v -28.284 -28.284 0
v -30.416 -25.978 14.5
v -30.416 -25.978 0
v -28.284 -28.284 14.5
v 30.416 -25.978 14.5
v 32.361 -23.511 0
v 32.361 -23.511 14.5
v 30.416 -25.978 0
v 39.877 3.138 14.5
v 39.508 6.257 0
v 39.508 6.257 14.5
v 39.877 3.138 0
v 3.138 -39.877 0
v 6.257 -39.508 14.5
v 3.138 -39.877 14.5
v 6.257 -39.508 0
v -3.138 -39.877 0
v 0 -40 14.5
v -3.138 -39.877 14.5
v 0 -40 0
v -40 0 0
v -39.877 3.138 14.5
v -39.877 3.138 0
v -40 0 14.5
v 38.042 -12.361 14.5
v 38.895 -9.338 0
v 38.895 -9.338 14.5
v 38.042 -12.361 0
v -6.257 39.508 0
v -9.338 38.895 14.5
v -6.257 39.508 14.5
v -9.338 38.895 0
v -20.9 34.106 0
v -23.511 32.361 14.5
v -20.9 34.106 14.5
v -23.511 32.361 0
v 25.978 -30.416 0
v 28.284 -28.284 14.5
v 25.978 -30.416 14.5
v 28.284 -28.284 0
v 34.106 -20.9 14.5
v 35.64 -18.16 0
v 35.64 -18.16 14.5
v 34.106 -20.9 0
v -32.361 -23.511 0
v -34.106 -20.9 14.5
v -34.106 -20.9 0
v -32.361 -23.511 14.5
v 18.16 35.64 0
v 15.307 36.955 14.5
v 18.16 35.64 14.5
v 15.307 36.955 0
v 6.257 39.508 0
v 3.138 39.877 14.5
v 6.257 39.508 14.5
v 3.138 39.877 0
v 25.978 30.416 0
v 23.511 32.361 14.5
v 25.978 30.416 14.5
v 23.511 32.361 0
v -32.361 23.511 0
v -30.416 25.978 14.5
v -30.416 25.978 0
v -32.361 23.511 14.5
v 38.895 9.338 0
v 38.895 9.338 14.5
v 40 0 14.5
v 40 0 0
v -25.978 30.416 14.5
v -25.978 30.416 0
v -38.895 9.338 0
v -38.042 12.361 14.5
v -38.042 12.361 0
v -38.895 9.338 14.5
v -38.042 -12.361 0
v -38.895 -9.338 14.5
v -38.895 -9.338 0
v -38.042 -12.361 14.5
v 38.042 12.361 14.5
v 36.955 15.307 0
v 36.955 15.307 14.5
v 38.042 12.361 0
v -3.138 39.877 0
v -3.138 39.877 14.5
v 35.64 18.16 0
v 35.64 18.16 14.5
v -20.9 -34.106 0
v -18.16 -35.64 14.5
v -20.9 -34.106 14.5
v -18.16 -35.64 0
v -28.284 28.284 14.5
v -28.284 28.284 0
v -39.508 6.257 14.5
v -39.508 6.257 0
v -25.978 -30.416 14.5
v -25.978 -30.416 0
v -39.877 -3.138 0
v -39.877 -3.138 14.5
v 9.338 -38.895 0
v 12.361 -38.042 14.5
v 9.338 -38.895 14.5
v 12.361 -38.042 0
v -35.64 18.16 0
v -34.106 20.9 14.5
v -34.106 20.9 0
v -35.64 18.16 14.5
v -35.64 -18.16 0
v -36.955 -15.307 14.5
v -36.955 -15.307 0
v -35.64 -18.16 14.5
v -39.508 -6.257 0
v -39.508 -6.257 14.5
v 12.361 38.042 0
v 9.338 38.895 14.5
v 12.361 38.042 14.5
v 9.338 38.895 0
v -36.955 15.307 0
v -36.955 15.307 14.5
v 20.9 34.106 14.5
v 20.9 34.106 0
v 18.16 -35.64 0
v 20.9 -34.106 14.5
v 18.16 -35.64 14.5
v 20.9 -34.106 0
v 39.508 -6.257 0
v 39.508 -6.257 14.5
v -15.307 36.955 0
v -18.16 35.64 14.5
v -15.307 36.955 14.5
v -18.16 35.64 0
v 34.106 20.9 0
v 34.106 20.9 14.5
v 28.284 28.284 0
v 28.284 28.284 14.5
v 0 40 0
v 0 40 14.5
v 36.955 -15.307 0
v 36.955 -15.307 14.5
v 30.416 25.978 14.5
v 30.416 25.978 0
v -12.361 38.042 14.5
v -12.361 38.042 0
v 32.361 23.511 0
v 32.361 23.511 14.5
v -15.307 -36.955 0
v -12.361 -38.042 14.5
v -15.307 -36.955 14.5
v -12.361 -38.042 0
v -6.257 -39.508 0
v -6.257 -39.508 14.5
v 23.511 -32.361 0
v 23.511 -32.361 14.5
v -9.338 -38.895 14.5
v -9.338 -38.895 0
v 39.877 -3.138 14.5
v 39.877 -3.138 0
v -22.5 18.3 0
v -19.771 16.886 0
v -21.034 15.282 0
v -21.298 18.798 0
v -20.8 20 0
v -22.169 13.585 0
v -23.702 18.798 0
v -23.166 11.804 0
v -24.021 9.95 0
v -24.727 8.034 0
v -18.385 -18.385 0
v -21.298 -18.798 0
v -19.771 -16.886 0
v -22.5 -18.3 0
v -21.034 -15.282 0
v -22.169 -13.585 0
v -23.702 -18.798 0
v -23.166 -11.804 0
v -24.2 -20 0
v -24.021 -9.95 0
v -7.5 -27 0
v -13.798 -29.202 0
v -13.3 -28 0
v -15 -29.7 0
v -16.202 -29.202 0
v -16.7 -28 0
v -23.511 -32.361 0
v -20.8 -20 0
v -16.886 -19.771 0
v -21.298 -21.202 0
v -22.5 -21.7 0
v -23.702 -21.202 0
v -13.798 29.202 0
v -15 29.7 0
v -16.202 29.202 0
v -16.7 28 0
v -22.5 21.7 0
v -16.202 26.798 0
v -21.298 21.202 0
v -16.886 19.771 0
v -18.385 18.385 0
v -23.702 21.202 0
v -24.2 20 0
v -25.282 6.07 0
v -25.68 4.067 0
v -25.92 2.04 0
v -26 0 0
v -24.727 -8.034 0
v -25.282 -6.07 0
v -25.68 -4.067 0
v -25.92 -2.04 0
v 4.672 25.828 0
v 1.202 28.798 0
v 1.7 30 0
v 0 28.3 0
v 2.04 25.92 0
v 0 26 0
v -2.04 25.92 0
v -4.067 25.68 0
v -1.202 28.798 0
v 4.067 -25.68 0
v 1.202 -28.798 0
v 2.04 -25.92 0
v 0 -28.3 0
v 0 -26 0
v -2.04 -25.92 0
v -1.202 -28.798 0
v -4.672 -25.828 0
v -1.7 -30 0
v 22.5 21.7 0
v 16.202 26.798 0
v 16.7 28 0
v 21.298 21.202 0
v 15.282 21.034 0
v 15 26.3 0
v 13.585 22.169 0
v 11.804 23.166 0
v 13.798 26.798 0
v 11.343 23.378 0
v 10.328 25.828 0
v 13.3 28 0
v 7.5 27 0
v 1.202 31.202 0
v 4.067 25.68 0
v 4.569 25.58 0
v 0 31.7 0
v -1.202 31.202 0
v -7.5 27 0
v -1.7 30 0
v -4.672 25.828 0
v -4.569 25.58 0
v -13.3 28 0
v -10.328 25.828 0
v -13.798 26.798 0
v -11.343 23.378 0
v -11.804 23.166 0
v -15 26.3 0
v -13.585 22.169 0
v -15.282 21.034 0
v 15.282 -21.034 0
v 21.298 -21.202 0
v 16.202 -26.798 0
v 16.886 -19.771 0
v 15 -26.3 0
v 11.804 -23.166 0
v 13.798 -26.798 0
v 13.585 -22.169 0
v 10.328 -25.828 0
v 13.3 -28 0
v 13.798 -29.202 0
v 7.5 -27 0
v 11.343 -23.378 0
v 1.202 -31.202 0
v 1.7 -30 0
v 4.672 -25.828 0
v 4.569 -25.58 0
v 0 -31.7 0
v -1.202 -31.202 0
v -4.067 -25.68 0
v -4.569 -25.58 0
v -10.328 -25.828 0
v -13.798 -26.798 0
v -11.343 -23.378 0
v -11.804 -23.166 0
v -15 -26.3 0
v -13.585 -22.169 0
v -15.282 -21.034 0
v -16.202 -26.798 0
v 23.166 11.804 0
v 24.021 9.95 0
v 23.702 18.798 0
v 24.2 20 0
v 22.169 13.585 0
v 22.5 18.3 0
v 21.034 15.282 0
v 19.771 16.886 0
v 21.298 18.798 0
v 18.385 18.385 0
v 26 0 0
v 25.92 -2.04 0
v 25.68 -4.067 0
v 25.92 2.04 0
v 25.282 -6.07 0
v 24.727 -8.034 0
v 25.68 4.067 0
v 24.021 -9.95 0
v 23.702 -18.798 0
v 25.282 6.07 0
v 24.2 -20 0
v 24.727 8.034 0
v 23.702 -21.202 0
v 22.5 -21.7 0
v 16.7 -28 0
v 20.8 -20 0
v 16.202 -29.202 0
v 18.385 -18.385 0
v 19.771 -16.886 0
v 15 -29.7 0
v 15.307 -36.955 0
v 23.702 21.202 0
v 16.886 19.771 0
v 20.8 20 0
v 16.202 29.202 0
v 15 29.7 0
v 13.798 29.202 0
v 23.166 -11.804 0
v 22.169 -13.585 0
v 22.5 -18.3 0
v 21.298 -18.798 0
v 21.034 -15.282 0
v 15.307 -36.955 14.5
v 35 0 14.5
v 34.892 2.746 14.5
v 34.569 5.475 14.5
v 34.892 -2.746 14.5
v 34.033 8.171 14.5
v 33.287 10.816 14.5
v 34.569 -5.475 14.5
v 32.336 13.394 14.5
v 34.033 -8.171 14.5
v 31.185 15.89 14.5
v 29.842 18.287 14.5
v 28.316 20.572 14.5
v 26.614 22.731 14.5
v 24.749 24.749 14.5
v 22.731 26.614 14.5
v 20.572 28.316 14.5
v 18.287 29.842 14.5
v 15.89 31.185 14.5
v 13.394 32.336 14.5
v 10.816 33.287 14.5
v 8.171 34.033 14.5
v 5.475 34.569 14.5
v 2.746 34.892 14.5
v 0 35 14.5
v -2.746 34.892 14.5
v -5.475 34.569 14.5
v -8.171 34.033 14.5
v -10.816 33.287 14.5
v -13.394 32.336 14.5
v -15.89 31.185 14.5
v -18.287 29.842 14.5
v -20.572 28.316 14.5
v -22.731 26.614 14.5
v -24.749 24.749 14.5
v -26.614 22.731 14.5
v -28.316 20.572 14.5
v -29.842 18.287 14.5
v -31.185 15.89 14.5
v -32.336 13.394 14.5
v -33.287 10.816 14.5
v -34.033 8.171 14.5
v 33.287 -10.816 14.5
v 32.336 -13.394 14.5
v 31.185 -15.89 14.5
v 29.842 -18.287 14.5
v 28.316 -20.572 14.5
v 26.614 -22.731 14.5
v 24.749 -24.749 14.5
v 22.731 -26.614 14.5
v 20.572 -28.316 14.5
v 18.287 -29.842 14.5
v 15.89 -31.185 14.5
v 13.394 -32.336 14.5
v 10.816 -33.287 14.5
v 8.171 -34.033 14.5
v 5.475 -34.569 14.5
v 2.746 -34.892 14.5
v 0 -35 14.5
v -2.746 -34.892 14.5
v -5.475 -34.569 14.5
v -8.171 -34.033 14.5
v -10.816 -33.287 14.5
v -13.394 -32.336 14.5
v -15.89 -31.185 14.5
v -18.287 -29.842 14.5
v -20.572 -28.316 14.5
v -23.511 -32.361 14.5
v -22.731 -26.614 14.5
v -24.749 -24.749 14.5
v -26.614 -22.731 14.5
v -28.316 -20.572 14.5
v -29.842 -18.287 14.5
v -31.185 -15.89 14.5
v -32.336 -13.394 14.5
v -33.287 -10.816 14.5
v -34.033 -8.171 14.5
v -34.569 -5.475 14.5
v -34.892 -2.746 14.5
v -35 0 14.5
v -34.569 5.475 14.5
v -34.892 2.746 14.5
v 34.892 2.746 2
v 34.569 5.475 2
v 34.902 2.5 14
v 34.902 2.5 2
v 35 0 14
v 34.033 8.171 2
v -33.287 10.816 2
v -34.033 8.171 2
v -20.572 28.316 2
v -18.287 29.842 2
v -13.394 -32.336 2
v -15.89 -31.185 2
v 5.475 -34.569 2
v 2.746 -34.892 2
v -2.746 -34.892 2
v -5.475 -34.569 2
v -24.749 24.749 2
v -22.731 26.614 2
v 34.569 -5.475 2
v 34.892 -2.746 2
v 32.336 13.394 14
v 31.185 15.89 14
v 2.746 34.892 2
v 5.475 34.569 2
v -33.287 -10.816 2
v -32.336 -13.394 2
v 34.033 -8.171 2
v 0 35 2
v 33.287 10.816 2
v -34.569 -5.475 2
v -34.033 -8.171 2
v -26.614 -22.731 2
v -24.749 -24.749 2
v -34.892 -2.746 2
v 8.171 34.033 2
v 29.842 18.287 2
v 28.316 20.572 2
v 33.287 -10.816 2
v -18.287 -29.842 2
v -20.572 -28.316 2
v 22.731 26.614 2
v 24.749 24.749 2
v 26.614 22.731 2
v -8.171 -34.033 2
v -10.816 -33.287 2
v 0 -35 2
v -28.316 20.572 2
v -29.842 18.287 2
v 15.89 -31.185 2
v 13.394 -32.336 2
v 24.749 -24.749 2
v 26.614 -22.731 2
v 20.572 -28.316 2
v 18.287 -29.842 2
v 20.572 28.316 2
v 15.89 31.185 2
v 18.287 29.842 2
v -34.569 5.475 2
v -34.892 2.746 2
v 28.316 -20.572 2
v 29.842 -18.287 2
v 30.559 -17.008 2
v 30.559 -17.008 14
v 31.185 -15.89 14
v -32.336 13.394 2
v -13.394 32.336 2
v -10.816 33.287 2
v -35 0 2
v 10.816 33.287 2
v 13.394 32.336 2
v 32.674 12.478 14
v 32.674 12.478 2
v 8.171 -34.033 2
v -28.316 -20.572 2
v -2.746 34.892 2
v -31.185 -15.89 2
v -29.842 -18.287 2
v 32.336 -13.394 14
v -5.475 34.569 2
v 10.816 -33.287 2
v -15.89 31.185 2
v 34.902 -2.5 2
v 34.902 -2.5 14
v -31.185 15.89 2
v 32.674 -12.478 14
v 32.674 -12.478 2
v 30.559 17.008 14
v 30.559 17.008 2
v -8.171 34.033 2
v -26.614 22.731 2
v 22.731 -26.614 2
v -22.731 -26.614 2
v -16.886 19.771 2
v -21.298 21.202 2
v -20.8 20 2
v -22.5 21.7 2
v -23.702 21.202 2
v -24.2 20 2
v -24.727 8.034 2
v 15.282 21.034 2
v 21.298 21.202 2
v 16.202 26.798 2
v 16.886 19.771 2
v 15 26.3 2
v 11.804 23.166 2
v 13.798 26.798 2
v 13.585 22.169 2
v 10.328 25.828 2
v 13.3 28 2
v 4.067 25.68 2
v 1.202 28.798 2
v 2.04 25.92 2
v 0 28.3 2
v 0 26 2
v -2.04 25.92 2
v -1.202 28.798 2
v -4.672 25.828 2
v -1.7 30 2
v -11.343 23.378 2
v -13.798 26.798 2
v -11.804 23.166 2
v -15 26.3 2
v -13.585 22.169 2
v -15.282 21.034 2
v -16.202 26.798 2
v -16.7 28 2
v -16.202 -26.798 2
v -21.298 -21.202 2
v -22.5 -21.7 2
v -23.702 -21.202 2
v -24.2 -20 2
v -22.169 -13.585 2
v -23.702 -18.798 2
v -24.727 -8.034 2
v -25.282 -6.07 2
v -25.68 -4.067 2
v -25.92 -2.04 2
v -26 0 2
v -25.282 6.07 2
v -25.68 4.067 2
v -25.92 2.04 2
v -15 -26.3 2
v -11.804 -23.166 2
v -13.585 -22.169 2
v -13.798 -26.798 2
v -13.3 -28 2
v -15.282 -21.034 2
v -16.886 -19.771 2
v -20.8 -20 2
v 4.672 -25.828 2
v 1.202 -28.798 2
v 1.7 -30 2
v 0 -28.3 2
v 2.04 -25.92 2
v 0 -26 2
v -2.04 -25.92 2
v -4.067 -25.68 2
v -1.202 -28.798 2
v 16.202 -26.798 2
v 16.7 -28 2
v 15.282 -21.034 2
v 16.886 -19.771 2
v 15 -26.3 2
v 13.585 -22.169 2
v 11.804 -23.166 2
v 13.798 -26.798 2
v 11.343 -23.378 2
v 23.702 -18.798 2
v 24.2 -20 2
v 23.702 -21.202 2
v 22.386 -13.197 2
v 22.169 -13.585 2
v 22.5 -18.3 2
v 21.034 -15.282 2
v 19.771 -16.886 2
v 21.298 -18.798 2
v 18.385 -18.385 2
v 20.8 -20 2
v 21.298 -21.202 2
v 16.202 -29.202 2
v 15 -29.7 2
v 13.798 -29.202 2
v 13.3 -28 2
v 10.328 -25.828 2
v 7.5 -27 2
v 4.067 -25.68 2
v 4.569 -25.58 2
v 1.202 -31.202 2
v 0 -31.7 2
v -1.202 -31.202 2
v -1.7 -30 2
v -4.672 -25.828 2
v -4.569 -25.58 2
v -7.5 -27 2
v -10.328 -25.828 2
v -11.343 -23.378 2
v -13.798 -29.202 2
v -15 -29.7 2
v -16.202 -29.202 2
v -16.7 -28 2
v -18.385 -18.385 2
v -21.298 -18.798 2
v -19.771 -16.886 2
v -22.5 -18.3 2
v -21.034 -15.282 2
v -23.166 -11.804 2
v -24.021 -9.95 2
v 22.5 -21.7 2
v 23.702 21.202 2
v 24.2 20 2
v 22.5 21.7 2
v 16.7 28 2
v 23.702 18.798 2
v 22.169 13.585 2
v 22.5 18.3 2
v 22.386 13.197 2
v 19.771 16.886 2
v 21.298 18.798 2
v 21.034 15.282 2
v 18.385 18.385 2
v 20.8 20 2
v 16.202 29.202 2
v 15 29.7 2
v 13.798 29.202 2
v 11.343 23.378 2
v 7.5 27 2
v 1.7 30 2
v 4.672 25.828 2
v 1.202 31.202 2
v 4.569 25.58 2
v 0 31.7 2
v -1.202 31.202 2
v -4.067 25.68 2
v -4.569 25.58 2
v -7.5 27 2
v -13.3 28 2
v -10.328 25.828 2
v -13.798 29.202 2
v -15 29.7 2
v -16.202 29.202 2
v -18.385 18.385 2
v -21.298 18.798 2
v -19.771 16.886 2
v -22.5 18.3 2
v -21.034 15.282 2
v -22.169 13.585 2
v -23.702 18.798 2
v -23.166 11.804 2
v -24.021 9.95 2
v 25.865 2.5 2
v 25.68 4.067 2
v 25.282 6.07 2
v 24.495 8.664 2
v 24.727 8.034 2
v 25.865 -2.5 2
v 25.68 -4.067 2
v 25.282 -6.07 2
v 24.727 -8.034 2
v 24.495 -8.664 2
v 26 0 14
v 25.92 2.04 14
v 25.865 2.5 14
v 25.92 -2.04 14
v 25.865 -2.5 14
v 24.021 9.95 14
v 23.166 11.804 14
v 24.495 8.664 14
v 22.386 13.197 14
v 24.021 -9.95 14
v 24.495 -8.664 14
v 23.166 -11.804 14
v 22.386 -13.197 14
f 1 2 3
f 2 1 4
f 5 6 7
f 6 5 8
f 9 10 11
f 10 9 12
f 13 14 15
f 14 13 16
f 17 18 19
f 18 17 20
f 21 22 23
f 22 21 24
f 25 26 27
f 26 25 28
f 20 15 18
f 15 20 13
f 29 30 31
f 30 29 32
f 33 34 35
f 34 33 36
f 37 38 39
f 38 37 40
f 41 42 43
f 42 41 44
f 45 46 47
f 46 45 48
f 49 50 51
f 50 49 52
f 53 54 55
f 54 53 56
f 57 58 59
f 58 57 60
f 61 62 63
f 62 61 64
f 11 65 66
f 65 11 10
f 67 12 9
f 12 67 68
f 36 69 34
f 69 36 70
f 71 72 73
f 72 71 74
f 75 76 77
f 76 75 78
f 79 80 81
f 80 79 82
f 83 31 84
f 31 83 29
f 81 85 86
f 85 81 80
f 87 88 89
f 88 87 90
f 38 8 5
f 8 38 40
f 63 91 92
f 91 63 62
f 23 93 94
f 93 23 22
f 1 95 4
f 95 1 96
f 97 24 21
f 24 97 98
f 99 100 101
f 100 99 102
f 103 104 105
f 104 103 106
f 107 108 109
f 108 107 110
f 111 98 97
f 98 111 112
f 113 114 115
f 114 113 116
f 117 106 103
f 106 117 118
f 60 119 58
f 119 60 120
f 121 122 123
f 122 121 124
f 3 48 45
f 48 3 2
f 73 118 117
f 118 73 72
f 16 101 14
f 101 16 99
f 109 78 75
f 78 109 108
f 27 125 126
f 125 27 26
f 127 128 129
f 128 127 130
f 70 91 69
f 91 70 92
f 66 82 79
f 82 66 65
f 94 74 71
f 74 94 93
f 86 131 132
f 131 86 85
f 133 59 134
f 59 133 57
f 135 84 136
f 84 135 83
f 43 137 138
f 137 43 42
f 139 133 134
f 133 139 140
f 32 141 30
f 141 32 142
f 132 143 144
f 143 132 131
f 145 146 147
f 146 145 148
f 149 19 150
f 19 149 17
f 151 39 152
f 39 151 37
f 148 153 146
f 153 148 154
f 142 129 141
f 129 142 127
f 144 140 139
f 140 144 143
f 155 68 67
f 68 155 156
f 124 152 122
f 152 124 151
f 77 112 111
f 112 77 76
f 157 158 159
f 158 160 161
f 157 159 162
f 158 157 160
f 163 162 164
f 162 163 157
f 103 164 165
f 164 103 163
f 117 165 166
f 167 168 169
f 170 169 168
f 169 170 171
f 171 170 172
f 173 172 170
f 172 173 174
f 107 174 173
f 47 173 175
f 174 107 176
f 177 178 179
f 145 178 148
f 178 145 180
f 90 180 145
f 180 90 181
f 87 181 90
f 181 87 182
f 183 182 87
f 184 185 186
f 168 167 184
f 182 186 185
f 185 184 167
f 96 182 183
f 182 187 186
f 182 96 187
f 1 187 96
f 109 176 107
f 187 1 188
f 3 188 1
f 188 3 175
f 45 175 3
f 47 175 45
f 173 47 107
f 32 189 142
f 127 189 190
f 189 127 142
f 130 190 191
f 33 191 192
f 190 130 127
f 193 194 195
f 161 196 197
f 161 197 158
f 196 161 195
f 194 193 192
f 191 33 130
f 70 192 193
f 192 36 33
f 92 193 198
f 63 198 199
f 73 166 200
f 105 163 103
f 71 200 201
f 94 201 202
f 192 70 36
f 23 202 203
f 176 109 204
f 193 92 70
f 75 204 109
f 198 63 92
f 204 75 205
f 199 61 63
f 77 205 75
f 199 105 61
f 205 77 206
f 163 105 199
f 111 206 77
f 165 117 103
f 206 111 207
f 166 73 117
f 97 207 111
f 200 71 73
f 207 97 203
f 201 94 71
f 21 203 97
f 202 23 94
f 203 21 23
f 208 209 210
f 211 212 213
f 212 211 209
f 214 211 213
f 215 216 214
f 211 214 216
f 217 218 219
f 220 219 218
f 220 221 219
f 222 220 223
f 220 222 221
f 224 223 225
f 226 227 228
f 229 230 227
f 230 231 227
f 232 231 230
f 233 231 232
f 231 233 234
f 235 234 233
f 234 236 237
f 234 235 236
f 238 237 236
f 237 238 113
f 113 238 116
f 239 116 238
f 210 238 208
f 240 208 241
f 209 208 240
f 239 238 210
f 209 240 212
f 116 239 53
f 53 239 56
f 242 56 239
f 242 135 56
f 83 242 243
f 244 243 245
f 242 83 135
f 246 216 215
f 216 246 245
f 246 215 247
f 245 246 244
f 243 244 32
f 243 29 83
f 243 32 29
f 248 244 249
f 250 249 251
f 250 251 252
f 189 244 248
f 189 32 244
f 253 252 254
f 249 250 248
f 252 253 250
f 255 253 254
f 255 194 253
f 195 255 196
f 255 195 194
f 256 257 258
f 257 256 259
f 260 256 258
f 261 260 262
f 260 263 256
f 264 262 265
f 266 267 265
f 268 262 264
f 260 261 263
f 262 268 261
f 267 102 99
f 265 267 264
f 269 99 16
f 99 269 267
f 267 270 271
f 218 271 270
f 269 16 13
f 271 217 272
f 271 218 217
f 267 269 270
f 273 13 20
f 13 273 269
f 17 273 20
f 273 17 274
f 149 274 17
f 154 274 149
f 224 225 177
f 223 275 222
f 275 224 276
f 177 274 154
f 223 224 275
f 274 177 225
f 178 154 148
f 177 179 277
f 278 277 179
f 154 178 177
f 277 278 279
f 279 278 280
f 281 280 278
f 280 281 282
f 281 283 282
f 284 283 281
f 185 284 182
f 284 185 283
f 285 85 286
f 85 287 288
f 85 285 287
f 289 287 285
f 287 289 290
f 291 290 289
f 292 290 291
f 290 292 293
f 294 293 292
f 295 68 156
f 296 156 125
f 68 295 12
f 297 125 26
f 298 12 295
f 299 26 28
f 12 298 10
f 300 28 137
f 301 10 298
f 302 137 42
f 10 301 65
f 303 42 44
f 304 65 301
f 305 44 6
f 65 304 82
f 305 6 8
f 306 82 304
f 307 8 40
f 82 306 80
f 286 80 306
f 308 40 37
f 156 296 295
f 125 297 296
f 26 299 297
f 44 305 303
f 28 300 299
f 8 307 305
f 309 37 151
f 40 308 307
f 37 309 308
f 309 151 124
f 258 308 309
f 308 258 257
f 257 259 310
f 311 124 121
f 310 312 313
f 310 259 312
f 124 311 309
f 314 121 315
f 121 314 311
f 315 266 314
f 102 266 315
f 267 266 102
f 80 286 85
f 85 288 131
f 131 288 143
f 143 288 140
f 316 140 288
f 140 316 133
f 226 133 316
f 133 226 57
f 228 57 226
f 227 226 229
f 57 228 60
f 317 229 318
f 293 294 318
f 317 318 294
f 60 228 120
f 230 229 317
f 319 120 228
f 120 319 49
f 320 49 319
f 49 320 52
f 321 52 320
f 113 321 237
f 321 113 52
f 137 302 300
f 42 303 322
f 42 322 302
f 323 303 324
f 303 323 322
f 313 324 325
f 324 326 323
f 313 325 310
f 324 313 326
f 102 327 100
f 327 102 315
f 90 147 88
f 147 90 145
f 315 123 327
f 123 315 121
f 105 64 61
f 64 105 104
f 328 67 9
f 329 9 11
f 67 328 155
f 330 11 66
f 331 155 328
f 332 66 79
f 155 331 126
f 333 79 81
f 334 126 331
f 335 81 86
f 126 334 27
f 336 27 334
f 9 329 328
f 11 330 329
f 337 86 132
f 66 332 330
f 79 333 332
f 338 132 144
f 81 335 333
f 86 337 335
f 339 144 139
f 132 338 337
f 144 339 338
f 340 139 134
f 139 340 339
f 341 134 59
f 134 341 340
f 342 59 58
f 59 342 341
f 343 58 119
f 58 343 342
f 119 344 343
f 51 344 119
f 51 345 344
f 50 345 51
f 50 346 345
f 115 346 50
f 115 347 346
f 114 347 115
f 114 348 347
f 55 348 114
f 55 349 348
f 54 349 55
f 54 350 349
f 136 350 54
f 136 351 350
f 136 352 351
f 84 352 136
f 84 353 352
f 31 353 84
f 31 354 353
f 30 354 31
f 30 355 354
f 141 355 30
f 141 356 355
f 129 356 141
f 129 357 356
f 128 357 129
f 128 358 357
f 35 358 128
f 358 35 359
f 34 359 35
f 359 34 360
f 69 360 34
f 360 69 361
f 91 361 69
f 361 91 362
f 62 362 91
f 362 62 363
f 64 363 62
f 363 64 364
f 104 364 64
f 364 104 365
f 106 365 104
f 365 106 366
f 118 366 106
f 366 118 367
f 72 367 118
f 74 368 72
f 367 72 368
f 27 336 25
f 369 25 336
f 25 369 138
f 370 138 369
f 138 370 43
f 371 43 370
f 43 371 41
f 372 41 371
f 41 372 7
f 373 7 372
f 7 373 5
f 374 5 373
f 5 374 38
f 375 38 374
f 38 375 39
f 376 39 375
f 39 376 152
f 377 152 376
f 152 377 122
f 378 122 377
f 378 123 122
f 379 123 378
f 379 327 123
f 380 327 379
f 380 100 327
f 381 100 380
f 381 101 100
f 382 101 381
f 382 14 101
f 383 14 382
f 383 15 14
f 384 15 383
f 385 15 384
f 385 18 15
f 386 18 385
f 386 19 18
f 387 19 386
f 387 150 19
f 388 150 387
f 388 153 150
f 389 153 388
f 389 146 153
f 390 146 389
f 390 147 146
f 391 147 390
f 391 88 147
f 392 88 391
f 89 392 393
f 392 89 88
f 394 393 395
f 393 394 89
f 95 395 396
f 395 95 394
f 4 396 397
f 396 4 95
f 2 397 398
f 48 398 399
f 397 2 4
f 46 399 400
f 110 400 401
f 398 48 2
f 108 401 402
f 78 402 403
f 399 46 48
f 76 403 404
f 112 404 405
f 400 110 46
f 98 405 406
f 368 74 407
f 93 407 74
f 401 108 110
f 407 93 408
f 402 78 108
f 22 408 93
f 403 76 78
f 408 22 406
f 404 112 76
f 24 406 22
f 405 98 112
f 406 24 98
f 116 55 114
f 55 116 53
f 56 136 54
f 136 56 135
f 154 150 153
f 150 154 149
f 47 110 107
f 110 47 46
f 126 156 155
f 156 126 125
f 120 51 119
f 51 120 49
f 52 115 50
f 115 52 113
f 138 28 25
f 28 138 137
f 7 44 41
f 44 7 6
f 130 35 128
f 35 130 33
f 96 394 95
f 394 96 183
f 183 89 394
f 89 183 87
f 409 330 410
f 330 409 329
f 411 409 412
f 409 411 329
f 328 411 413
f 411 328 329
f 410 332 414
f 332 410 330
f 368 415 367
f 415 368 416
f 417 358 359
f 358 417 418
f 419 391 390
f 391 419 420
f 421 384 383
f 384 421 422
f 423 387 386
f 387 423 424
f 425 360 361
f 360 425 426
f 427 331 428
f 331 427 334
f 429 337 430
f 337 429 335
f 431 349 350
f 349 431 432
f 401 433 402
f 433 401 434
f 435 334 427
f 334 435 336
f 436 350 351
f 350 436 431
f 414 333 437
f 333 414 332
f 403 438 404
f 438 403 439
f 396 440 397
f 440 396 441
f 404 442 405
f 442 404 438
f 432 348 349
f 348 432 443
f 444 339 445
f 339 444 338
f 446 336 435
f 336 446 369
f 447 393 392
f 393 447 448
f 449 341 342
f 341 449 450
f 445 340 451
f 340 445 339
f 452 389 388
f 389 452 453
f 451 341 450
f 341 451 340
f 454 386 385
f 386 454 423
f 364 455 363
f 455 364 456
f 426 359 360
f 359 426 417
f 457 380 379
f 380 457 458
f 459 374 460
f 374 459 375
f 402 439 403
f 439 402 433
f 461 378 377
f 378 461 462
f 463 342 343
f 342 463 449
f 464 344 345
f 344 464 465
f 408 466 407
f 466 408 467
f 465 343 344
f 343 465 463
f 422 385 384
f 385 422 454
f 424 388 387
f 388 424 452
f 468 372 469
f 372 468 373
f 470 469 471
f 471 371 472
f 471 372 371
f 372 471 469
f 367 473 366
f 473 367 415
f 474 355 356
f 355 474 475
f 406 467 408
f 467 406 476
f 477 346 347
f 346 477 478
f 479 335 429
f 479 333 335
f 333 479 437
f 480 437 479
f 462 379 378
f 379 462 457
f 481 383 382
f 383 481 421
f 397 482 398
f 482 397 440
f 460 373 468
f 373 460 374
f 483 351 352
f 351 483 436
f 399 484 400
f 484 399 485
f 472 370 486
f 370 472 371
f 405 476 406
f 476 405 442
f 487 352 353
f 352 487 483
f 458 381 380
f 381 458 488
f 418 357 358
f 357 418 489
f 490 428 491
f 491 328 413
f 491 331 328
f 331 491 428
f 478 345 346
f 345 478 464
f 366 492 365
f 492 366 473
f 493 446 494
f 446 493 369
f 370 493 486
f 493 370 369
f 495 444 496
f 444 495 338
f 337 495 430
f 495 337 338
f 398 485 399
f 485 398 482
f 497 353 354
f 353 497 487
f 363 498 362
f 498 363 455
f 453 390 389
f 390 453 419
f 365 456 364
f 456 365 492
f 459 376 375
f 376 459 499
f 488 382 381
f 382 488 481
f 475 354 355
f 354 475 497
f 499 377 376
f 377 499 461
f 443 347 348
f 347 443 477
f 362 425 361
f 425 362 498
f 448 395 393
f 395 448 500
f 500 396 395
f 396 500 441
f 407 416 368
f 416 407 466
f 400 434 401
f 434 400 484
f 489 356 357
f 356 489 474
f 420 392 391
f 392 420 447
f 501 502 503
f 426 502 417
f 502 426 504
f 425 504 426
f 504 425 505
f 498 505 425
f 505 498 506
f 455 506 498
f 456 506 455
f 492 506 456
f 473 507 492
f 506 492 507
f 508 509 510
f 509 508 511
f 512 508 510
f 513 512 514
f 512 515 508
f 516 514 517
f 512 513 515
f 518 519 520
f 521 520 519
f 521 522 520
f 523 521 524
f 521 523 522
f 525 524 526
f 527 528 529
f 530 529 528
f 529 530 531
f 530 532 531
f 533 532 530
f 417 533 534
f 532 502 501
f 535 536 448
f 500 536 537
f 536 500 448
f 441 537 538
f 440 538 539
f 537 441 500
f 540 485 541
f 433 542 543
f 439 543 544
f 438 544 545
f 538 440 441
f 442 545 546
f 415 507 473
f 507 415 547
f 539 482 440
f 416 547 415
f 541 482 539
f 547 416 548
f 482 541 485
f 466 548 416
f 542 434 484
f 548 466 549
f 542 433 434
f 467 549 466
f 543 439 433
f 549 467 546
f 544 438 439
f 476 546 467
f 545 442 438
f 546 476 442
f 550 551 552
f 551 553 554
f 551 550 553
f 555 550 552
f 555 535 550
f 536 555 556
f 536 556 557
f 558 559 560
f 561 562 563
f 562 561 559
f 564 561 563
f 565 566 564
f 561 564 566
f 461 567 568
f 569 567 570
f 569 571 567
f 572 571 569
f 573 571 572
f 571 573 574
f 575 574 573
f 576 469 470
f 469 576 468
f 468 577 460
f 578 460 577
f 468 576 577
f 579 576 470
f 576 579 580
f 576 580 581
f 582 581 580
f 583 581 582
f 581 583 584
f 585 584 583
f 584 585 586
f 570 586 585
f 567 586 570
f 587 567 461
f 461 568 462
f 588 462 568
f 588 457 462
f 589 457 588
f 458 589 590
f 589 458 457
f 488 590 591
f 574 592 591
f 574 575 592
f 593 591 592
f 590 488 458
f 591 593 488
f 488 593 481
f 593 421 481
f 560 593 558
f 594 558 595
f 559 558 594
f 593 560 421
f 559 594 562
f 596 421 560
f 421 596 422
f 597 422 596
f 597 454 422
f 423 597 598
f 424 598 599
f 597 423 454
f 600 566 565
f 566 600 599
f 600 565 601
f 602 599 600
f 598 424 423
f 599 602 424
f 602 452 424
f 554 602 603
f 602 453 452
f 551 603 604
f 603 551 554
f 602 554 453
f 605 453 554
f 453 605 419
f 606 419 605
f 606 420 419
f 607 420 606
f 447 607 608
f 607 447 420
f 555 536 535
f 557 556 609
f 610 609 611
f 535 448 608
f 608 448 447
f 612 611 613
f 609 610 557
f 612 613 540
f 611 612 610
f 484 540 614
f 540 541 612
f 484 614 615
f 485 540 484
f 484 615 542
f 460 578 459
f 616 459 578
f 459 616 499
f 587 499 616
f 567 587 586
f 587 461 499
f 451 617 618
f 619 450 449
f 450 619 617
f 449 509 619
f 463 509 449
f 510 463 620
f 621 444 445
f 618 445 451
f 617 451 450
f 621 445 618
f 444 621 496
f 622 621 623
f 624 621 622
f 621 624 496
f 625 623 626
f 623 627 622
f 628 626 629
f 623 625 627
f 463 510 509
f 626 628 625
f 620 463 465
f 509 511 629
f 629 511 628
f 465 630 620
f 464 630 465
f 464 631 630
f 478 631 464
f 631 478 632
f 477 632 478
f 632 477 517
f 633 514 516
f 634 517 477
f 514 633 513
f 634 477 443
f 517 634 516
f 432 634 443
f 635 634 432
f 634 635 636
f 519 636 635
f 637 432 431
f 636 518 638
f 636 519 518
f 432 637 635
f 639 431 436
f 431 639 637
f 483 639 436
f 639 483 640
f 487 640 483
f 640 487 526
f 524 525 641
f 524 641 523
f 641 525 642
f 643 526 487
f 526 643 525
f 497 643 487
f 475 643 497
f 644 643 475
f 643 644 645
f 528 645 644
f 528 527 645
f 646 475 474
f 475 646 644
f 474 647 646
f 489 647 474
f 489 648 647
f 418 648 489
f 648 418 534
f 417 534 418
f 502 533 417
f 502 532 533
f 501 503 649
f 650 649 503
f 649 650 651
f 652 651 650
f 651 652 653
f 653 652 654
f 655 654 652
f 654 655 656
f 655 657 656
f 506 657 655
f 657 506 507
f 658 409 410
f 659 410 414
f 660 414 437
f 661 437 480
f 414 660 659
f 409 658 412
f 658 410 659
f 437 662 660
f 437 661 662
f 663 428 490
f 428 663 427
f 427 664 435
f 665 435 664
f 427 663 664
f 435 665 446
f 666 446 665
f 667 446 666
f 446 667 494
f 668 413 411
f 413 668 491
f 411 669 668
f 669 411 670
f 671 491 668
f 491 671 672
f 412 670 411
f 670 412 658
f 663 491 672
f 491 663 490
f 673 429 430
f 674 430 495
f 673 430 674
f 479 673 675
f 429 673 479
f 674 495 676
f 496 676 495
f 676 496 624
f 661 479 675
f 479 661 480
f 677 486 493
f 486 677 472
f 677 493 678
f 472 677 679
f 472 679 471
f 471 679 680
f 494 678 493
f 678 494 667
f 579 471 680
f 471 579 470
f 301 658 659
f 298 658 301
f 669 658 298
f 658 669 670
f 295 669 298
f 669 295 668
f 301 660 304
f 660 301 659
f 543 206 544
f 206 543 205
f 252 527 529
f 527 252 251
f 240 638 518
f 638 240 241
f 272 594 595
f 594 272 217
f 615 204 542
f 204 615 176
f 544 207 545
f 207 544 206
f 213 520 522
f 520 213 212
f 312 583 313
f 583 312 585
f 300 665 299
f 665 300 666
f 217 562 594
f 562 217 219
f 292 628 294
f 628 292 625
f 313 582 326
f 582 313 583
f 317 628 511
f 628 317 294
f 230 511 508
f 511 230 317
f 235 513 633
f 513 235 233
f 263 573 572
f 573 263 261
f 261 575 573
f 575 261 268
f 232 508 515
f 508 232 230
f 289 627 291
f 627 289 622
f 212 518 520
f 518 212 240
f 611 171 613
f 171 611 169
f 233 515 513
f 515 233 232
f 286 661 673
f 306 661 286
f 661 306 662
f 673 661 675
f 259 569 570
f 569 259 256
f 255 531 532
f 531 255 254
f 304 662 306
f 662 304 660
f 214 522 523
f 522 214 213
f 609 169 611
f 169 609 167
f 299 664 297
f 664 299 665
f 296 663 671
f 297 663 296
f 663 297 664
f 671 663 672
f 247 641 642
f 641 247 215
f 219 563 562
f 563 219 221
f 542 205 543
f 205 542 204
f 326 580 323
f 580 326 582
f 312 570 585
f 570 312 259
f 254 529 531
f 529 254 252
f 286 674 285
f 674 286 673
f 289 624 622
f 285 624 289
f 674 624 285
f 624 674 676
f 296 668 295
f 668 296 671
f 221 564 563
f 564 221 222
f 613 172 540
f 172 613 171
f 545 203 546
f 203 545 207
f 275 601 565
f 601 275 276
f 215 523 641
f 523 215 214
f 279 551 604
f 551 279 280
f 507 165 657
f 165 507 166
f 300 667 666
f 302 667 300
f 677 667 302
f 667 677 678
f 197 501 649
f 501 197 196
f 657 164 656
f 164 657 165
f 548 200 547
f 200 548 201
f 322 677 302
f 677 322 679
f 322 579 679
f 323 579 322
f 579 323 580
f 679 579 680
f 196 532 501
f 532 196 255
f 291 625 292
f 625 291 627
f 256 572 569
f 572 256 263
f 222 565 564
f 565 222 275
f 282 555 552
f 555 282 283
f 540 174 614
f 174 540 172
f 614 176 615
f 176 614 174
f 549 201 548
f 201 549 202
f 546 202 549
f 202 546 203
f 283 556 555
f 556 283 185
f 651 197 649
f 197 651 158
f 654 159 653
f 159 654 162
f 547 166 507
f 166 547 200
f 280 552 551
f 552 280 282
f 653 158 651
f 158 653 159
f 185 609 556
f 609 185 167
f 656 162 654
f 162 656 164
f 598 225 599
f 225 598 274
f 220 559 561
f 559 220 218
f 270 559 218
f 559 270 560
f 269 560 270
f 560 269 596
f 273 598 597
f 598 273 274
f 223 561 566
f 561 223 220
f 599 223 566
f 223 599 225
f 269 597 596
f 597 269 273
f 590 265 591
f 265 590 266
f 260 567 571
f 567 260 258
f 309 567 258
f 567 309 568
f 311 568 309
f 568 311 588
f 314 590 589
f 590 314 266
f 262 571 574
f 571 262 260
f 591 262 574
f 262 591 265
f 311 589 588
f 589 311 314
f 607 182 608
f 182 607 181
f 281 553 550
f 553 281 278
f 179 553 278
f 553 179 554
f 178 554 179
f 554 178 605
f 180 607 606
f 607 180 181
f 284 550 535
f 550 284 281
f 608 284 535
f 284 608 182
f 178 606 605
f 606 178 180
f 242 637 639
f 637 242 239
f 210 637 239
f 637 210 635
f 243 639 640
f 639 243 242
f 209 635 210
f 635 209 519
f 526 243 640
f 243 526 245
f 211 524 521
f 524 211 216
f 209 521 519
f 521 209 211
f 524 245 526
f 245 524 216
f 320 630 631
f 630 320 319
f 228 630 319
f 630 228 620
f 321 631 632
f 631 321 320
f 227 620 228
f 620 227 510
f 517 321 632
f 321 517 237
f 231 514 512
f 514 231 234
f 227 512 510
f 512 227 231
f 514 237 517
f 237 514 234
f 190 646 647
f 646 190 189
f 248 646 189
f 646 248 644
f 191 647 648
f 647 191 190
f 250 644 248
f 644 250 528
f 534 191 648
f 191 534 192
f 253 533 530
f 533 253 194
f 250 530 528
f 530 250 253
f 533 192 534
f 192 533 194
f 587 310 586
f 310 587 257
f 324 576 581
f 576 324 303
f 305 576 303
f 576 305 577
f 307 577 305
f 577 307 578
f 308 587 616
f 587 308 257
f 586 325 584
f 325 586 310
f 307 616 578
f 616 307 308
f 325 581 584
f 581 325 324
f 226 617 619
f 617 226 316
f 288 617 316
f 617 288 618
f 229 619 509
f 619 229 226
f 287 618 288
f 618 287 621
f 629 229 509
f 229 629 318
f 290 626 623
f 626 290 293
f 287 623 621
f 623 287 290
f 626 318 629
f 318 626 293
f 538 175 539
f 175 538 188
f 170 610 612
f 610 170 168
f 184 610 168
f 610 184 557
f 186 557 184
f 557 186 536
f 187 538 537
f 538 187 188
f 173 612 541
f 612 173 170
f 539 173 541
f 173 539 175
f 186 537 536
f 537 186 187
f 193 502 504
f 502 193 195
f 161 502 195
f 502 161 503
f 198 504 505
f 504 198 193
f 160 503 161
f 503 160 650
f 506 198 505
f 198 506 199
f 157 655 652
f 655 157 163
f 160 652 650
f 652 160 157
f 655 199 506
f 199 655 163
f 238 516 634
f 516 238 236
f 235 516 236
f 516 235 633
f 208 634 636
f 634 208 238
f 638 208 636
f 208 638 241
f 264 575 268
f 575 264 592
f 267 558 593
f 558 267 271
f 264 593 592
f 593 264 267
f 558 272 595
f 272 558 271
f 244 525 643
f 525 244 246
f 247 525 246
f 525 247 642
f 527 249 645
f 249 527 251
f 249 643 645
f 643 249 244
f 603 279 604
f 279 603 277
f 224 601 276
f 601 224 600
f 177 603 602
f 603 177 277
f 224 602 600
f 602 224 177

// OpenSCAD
// AIR HOCKEY ROBOT PROJECT (AHROBOT)
// 
// by Jose Julio

// X axis carriage base

diameter = 80;
rod_separation=45;
bearing_diameter=15.5;
bearing_length=26;


module border()
{
	difference()
	{
	cylinder (r=diameter/2, h=4.5,center=true,$fn=80);
	cylinder (r=diameter/2-4.5, h=6,center=true,$fn=80);
	}
}

module x_carriage_beltcut(){
 // Cut in the middle for belt
 translate([-5.5+1,16.5,8]) cube([8,25,15]);
 // Cut clearing space for the belt
 //translate([-38,5,8]) cube([40,13,15]);
 // Belt slit
 translate([-32,16,8]) cube([80,1.25,15]);
 // Smooth entrance
 translate([-30,16.5,15.3]) rotate([45,0,0]) cube([80,15,15]);
 // Smooth the block on the upper side
 //translate([-66,27,15]) rotate([30,0,0]) cube([80,15,15]);
 // Teeth cuts (GT2)
 for ( i = [0 : 32] ){
  translate([30-i*2,14.5,8]) cube([1.15,2,15]);
 }
}

module belt()
{
	difference()
	{
	translate ([9,0,8]) cube([12,38,16],center=true);
	translate([25,0,-2]) rotate([0,0,90]) x_carriage_beltcut();
	}
}

module x_carriage_base()
{	
	cylinder (r=diameter/2, h=2,center=true,$fn=80);
	translate([0,0,2]) border();

	// bearing bases
	translate([rod_separation/2,0,5]) cube([20,bearing_length,10],center=true);
	translate([-rod_separation/2,0,5]) cube([20,bearing_length,10],center=true);

	//belt();
}

module x_carriage_holes()
{
	// bearing holes
	translate([rod_separation/2,0,-2]) horizontal_bearing_holes();
	translate([-rod_separation/2,0,-2]) horizontal_bearing_holes();

	// holes for belt
	translate([7.5,23,0]) cylinder(r=1.65,h=20,center=true,$fn=8);
	translate([7.5,-23,0]) cylinder(r=1.65,h=20,center=true,$fn=8);
	translate([-7.5,23,0]) cylinder(r=1.65,h=20,center=true,$fn=8);
	translate([-7.5,-23,0]) cylinder(r=1.65,h=20,center=true,$fn=8);
	

	// M3 holes
	translate([0,-30,0]) cylinder(r=1.7,h=20,center=true,$fn=8);
	translate([15,-28,0]) cylinder(r=1.7,h=20,center=true,$fn=8);
	translate([-15,-28,0]) cylinder(r=1.7,h=20,center=true,$fn=8);
	translate([0,30,0]) cylinder(r=1.7,h=20,center=true,$fn=8);
	translate([15,28,0]) cylinder(r=1.7,h=20,center=true,$fn=8);
	translate([-15,28,0]) cylinder(r=1.7,h=20,center=true,$fn=8);

	translate([rod_separation/2,-20,0]) cylinder(r=1.7,h=20,center=true,$fn=8);
	translate([rod_separation/2,20,0]) cylinder(r=1.7,h=20,center=true,$fn=8);
	translate([-rod_separation/2,-20,0]) cylinder(r=1.7,h=20,center=true,$fn=8);
	translate([-rod_separation/2,20,0]) cylinder(r=1.7,h=20,center=true,$fn=8);
}


module border_pusher()
{
	difference()
	{
	cylinder (r=diameter/2, h=14.5,$fn=80);
	cylinder (r=diameter/2-5, h=15,$fn=80);
	}
}

module x_carriage_pusher_base()
{	
	cylinder (r=diameter/2, h=2,$fn=80);
	translate([0,0,0]) border_pusher();

	translate([30,0,7]) cube([10,5,14],center=true);
	rotate([0,0,25])translate([30,0,7]) cube([10,5,14],center=true);
	rotate([0,0,-25])translate([30,0,7]) cube([10,5,14],center=true);
	
}


module x_carriage_pusher_holes()
{
	cylinder (r=diameter/2-14, h=50,center=true,$fn=80);	

	// M3 holes
	translate([0,-30,0]) cylinder(r=1.7,h=20,center=true,$fn=8);
	translate([15,-28,0]) cylinder(r=1.7,h=20,center=true,$fn=8);
	translate([-15,-28,0]) cylinder(r=1.7,h=20,center=true,$fn=8);
	translate([0,30,0]) cylinder(r=1.7,h=20,center=true,$fn=8);
	translate([15,28,0]) cylinder(r=1.7,h=20,center=true,$fn=8);
	translate([-15,28,0]) cylinder(r=1.7,h=20,center=true,$fn=8);

	translate([rod_separation/2,-20,0]) cylinder(r=1.7,h=20,center=true,$fn=8);
	translate([rod_separation/2,20,0]) cylinder(r=1.7,h=20,center=true,$fn=8);
	translate([-rod_separation/2,-20,0]) cylinder(r=1.7,h=20,center=true,$fn=8);
	translate([-rod_separation/2,20,0]) cylinder(r=1.7,h=20,center=true,$fn=8);

	// holes for belt
	translate([7.5,23,0]) cylinder(r=4,h=20,center=true,$fn=8);
	translate([7.5,-23,0]) cylinder(r=4,h=20,center=true,$fn=8);
	translate([-7.5,23,0]) cylinder(r=4,h=20,center=true,$fn=8);
	translate([-7.5,-23,0]) cylinder(r=4,h=20,center=true,$fn=8);
}


/*
difference()
{
x_carriage_base();
x_carriage_holes();
}
*/

difference()
{
x_carriage_pusher_base();
x_carriage_pusher_holes();
}
